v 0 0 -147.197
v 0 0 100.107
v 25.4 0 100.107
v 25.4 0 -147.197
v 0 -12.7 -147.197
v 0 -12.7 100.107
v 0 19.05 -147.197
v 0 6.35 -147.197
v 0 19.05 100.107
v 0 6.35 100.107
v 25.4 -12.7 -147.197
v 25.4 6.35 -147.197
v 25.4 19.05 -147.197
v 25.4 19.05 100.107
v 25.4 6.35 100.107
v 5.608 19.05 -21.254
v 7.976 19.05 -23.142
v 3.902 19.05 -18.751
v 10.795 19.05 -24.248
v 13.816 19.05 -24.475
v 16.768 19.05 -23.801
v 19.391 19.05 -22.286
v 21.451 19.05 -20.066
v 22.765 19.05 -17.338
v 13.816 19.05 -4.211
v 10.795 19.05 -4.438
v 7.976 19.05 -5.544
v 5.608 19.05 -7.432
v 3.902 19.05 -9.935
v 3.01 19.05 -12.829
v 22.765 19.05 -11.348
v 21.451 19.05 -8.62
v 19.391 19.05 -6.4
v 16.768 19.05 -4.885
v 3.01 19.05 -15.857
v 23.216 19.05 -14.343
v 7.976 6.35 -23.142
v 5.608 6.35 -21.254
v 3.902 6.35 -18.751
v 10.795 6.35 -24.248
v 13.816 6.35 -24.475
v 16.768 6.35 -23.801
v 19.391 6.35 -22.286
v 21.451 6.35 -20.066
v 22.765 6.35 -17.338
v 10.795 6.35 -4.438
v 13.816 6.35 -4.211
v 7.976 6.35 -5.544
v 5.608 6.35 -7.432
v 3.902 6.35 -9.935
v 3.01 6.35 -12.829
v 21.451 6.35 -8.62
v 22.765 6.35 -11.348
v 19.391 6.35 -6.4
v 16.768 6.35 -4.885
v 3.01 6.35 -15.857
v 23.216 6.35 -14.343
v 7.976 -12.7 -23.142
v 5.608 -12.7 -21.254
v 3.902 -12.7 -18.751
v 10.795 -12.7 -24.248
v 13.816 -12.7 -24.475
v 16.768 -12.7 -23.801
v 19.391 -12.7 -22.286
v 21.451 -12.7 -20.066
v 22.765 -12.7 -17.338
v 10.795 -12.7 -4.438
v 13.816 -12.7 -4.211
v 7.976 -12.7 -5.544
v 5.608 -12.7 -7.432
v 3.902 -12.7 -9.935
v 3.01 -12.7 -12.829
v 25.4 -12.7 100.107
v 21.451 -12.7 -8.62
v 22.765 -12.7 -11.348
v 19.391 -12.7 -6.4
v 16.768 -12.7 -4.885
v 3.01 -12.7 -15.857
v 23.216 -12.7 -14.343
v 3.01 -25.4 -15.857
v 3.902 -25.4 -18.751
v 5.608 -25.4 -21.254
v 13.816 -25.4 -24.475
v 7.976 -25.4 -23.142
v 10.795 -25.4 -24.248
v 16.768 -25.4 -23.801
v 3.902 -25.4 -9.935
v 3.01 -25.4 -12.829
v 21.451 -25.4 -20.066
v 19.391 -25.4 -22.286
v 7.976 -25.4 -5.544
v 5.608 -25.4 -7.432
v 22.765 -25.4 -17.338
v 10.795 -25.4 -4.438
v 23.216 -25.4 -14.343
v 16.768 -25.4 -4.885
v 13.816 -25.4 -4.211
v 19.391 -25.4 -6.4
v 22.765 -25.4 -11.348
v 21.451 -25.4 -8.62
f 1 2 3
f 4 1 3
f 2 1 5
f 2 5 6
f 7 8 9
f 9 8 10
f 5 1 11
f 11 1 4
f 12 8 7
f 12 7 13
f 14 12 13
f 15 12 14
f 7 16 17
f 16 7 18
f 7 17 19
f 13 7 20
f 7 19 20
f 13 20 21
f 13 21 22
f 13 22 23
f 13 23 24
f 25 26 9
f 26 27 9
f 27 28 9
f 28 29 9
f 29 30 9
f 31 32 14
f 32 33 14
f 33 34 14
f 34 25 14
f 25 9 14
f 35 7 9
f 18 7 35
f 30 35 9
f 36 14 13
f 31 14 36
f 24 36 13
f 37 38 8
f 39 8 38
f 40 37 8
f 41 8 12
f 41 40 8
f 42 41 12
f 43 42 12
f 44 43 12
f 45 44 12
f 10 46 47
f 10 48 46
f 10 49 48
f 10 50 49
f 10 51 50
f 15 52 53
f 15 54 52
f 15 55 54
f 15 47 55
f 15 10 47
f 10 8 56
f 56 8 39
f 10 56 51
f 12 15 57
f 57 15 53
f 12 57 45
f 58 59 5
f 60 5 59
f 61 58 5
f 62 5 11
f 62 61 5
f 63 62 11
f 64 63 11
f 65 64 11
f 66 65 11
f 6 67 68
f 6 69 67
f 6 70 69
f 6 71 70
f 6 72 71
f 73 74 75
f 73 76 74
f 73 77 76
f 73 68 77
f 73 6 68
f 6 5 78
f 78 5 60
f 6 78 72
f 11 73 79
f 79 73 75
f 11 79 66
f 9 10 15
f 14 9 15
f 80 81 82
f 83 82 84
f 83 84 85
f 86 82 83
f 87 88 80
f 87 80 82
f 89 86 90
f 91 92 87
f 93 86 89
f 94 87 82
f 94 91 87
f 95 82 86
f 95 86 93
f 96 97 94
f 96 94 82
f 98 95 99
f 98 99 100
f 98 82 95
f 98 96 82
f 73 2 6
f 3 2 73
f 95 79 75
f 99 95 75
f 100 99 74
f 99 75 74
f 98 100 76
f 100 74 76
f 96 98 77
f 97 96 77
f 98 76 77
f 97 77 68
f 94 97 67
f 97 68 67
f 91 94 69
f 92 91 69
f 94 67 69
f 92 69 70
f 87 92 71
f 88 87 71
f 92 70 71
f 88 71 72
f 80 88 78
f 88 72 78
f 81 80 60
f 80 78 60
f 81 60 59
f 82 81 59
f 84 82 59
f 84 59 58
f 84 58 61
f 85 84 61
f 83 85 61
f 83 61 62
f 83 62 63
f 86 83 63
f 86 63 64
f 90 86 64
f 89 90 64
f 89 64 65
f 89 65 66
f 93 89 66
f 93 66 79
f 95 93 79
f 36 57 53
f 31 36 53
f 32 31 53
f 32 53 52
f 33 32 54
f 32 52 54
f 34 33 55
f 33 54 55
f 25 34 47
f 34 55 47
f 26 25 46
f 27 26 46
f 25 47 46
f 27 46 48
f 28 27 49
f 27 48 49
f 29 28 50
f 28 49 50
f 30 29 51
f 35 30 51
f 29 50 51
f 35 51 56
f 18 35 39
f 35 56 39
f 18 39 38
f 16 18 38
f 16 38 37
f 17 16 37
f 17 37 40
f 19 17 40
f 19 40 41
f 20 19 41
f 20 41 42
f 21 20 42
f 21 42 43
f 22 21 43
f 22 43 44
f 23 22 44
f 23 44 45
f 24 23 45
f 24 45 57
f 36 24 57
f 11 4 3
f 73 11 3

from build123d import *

# Parameters (mm, degrees)
F0_W     = 25.4
F0_H     = 247.304687
F0_R     = 10.16
F1_DEPTH = 12.7
F2_DEPTH = 25.4
F3_DEPTH = 19.05
F4_DEPTH = 6.35


with BuildPart() as f1:
    # F0 (on Front) → F1 (new body)
    with BuildSketch(Plane.XZ):
        with Locations((12.7, -23.54492)):
            Rectangle(F0_W, F0_H)
        with Locations((13.056295, -14.342986)):
            Circle(F0_R, mode=Mode.SUBTRACT)
    extrude(amount=F1_DEPTH)

    # F0 (on Front) → F2 (join)
    with BuildSketch(Plane.XZ):
        with Locations((13.056295, -14.342986)):
            Circle(F0_R)
    extrude(amount=F2_DEPTH)


with BuildPart() as f3:
    # F0 (on Front) → F3 (new body)
    with BuildSketch(Plane.XZ):
        with Locations((12.7, -23.54492)):
            Rectangle(F0_W, F0_H)
        with Locations((13.056295, -14.342986)):
            Circle(F0_R, mode=Mode.SUBTRACT)
    extrude(amount=-F3_DEPTH)

    # F0 (on Front) → F4 (cut)
    with BuildSketch(Plane.XZ):
        with Locations((12.7, -23.54492)):
            Rectangle(F0_W, F0_H)
        with Locations((13.056295, -14.342986)):
            Circle(F0_R, mode=Mode.SUBTRACT)
    extrude(amount=-F4_DEPTH, mode=Mode.SUBTRACT)


solid = Compound([f1.part, f3.part])
